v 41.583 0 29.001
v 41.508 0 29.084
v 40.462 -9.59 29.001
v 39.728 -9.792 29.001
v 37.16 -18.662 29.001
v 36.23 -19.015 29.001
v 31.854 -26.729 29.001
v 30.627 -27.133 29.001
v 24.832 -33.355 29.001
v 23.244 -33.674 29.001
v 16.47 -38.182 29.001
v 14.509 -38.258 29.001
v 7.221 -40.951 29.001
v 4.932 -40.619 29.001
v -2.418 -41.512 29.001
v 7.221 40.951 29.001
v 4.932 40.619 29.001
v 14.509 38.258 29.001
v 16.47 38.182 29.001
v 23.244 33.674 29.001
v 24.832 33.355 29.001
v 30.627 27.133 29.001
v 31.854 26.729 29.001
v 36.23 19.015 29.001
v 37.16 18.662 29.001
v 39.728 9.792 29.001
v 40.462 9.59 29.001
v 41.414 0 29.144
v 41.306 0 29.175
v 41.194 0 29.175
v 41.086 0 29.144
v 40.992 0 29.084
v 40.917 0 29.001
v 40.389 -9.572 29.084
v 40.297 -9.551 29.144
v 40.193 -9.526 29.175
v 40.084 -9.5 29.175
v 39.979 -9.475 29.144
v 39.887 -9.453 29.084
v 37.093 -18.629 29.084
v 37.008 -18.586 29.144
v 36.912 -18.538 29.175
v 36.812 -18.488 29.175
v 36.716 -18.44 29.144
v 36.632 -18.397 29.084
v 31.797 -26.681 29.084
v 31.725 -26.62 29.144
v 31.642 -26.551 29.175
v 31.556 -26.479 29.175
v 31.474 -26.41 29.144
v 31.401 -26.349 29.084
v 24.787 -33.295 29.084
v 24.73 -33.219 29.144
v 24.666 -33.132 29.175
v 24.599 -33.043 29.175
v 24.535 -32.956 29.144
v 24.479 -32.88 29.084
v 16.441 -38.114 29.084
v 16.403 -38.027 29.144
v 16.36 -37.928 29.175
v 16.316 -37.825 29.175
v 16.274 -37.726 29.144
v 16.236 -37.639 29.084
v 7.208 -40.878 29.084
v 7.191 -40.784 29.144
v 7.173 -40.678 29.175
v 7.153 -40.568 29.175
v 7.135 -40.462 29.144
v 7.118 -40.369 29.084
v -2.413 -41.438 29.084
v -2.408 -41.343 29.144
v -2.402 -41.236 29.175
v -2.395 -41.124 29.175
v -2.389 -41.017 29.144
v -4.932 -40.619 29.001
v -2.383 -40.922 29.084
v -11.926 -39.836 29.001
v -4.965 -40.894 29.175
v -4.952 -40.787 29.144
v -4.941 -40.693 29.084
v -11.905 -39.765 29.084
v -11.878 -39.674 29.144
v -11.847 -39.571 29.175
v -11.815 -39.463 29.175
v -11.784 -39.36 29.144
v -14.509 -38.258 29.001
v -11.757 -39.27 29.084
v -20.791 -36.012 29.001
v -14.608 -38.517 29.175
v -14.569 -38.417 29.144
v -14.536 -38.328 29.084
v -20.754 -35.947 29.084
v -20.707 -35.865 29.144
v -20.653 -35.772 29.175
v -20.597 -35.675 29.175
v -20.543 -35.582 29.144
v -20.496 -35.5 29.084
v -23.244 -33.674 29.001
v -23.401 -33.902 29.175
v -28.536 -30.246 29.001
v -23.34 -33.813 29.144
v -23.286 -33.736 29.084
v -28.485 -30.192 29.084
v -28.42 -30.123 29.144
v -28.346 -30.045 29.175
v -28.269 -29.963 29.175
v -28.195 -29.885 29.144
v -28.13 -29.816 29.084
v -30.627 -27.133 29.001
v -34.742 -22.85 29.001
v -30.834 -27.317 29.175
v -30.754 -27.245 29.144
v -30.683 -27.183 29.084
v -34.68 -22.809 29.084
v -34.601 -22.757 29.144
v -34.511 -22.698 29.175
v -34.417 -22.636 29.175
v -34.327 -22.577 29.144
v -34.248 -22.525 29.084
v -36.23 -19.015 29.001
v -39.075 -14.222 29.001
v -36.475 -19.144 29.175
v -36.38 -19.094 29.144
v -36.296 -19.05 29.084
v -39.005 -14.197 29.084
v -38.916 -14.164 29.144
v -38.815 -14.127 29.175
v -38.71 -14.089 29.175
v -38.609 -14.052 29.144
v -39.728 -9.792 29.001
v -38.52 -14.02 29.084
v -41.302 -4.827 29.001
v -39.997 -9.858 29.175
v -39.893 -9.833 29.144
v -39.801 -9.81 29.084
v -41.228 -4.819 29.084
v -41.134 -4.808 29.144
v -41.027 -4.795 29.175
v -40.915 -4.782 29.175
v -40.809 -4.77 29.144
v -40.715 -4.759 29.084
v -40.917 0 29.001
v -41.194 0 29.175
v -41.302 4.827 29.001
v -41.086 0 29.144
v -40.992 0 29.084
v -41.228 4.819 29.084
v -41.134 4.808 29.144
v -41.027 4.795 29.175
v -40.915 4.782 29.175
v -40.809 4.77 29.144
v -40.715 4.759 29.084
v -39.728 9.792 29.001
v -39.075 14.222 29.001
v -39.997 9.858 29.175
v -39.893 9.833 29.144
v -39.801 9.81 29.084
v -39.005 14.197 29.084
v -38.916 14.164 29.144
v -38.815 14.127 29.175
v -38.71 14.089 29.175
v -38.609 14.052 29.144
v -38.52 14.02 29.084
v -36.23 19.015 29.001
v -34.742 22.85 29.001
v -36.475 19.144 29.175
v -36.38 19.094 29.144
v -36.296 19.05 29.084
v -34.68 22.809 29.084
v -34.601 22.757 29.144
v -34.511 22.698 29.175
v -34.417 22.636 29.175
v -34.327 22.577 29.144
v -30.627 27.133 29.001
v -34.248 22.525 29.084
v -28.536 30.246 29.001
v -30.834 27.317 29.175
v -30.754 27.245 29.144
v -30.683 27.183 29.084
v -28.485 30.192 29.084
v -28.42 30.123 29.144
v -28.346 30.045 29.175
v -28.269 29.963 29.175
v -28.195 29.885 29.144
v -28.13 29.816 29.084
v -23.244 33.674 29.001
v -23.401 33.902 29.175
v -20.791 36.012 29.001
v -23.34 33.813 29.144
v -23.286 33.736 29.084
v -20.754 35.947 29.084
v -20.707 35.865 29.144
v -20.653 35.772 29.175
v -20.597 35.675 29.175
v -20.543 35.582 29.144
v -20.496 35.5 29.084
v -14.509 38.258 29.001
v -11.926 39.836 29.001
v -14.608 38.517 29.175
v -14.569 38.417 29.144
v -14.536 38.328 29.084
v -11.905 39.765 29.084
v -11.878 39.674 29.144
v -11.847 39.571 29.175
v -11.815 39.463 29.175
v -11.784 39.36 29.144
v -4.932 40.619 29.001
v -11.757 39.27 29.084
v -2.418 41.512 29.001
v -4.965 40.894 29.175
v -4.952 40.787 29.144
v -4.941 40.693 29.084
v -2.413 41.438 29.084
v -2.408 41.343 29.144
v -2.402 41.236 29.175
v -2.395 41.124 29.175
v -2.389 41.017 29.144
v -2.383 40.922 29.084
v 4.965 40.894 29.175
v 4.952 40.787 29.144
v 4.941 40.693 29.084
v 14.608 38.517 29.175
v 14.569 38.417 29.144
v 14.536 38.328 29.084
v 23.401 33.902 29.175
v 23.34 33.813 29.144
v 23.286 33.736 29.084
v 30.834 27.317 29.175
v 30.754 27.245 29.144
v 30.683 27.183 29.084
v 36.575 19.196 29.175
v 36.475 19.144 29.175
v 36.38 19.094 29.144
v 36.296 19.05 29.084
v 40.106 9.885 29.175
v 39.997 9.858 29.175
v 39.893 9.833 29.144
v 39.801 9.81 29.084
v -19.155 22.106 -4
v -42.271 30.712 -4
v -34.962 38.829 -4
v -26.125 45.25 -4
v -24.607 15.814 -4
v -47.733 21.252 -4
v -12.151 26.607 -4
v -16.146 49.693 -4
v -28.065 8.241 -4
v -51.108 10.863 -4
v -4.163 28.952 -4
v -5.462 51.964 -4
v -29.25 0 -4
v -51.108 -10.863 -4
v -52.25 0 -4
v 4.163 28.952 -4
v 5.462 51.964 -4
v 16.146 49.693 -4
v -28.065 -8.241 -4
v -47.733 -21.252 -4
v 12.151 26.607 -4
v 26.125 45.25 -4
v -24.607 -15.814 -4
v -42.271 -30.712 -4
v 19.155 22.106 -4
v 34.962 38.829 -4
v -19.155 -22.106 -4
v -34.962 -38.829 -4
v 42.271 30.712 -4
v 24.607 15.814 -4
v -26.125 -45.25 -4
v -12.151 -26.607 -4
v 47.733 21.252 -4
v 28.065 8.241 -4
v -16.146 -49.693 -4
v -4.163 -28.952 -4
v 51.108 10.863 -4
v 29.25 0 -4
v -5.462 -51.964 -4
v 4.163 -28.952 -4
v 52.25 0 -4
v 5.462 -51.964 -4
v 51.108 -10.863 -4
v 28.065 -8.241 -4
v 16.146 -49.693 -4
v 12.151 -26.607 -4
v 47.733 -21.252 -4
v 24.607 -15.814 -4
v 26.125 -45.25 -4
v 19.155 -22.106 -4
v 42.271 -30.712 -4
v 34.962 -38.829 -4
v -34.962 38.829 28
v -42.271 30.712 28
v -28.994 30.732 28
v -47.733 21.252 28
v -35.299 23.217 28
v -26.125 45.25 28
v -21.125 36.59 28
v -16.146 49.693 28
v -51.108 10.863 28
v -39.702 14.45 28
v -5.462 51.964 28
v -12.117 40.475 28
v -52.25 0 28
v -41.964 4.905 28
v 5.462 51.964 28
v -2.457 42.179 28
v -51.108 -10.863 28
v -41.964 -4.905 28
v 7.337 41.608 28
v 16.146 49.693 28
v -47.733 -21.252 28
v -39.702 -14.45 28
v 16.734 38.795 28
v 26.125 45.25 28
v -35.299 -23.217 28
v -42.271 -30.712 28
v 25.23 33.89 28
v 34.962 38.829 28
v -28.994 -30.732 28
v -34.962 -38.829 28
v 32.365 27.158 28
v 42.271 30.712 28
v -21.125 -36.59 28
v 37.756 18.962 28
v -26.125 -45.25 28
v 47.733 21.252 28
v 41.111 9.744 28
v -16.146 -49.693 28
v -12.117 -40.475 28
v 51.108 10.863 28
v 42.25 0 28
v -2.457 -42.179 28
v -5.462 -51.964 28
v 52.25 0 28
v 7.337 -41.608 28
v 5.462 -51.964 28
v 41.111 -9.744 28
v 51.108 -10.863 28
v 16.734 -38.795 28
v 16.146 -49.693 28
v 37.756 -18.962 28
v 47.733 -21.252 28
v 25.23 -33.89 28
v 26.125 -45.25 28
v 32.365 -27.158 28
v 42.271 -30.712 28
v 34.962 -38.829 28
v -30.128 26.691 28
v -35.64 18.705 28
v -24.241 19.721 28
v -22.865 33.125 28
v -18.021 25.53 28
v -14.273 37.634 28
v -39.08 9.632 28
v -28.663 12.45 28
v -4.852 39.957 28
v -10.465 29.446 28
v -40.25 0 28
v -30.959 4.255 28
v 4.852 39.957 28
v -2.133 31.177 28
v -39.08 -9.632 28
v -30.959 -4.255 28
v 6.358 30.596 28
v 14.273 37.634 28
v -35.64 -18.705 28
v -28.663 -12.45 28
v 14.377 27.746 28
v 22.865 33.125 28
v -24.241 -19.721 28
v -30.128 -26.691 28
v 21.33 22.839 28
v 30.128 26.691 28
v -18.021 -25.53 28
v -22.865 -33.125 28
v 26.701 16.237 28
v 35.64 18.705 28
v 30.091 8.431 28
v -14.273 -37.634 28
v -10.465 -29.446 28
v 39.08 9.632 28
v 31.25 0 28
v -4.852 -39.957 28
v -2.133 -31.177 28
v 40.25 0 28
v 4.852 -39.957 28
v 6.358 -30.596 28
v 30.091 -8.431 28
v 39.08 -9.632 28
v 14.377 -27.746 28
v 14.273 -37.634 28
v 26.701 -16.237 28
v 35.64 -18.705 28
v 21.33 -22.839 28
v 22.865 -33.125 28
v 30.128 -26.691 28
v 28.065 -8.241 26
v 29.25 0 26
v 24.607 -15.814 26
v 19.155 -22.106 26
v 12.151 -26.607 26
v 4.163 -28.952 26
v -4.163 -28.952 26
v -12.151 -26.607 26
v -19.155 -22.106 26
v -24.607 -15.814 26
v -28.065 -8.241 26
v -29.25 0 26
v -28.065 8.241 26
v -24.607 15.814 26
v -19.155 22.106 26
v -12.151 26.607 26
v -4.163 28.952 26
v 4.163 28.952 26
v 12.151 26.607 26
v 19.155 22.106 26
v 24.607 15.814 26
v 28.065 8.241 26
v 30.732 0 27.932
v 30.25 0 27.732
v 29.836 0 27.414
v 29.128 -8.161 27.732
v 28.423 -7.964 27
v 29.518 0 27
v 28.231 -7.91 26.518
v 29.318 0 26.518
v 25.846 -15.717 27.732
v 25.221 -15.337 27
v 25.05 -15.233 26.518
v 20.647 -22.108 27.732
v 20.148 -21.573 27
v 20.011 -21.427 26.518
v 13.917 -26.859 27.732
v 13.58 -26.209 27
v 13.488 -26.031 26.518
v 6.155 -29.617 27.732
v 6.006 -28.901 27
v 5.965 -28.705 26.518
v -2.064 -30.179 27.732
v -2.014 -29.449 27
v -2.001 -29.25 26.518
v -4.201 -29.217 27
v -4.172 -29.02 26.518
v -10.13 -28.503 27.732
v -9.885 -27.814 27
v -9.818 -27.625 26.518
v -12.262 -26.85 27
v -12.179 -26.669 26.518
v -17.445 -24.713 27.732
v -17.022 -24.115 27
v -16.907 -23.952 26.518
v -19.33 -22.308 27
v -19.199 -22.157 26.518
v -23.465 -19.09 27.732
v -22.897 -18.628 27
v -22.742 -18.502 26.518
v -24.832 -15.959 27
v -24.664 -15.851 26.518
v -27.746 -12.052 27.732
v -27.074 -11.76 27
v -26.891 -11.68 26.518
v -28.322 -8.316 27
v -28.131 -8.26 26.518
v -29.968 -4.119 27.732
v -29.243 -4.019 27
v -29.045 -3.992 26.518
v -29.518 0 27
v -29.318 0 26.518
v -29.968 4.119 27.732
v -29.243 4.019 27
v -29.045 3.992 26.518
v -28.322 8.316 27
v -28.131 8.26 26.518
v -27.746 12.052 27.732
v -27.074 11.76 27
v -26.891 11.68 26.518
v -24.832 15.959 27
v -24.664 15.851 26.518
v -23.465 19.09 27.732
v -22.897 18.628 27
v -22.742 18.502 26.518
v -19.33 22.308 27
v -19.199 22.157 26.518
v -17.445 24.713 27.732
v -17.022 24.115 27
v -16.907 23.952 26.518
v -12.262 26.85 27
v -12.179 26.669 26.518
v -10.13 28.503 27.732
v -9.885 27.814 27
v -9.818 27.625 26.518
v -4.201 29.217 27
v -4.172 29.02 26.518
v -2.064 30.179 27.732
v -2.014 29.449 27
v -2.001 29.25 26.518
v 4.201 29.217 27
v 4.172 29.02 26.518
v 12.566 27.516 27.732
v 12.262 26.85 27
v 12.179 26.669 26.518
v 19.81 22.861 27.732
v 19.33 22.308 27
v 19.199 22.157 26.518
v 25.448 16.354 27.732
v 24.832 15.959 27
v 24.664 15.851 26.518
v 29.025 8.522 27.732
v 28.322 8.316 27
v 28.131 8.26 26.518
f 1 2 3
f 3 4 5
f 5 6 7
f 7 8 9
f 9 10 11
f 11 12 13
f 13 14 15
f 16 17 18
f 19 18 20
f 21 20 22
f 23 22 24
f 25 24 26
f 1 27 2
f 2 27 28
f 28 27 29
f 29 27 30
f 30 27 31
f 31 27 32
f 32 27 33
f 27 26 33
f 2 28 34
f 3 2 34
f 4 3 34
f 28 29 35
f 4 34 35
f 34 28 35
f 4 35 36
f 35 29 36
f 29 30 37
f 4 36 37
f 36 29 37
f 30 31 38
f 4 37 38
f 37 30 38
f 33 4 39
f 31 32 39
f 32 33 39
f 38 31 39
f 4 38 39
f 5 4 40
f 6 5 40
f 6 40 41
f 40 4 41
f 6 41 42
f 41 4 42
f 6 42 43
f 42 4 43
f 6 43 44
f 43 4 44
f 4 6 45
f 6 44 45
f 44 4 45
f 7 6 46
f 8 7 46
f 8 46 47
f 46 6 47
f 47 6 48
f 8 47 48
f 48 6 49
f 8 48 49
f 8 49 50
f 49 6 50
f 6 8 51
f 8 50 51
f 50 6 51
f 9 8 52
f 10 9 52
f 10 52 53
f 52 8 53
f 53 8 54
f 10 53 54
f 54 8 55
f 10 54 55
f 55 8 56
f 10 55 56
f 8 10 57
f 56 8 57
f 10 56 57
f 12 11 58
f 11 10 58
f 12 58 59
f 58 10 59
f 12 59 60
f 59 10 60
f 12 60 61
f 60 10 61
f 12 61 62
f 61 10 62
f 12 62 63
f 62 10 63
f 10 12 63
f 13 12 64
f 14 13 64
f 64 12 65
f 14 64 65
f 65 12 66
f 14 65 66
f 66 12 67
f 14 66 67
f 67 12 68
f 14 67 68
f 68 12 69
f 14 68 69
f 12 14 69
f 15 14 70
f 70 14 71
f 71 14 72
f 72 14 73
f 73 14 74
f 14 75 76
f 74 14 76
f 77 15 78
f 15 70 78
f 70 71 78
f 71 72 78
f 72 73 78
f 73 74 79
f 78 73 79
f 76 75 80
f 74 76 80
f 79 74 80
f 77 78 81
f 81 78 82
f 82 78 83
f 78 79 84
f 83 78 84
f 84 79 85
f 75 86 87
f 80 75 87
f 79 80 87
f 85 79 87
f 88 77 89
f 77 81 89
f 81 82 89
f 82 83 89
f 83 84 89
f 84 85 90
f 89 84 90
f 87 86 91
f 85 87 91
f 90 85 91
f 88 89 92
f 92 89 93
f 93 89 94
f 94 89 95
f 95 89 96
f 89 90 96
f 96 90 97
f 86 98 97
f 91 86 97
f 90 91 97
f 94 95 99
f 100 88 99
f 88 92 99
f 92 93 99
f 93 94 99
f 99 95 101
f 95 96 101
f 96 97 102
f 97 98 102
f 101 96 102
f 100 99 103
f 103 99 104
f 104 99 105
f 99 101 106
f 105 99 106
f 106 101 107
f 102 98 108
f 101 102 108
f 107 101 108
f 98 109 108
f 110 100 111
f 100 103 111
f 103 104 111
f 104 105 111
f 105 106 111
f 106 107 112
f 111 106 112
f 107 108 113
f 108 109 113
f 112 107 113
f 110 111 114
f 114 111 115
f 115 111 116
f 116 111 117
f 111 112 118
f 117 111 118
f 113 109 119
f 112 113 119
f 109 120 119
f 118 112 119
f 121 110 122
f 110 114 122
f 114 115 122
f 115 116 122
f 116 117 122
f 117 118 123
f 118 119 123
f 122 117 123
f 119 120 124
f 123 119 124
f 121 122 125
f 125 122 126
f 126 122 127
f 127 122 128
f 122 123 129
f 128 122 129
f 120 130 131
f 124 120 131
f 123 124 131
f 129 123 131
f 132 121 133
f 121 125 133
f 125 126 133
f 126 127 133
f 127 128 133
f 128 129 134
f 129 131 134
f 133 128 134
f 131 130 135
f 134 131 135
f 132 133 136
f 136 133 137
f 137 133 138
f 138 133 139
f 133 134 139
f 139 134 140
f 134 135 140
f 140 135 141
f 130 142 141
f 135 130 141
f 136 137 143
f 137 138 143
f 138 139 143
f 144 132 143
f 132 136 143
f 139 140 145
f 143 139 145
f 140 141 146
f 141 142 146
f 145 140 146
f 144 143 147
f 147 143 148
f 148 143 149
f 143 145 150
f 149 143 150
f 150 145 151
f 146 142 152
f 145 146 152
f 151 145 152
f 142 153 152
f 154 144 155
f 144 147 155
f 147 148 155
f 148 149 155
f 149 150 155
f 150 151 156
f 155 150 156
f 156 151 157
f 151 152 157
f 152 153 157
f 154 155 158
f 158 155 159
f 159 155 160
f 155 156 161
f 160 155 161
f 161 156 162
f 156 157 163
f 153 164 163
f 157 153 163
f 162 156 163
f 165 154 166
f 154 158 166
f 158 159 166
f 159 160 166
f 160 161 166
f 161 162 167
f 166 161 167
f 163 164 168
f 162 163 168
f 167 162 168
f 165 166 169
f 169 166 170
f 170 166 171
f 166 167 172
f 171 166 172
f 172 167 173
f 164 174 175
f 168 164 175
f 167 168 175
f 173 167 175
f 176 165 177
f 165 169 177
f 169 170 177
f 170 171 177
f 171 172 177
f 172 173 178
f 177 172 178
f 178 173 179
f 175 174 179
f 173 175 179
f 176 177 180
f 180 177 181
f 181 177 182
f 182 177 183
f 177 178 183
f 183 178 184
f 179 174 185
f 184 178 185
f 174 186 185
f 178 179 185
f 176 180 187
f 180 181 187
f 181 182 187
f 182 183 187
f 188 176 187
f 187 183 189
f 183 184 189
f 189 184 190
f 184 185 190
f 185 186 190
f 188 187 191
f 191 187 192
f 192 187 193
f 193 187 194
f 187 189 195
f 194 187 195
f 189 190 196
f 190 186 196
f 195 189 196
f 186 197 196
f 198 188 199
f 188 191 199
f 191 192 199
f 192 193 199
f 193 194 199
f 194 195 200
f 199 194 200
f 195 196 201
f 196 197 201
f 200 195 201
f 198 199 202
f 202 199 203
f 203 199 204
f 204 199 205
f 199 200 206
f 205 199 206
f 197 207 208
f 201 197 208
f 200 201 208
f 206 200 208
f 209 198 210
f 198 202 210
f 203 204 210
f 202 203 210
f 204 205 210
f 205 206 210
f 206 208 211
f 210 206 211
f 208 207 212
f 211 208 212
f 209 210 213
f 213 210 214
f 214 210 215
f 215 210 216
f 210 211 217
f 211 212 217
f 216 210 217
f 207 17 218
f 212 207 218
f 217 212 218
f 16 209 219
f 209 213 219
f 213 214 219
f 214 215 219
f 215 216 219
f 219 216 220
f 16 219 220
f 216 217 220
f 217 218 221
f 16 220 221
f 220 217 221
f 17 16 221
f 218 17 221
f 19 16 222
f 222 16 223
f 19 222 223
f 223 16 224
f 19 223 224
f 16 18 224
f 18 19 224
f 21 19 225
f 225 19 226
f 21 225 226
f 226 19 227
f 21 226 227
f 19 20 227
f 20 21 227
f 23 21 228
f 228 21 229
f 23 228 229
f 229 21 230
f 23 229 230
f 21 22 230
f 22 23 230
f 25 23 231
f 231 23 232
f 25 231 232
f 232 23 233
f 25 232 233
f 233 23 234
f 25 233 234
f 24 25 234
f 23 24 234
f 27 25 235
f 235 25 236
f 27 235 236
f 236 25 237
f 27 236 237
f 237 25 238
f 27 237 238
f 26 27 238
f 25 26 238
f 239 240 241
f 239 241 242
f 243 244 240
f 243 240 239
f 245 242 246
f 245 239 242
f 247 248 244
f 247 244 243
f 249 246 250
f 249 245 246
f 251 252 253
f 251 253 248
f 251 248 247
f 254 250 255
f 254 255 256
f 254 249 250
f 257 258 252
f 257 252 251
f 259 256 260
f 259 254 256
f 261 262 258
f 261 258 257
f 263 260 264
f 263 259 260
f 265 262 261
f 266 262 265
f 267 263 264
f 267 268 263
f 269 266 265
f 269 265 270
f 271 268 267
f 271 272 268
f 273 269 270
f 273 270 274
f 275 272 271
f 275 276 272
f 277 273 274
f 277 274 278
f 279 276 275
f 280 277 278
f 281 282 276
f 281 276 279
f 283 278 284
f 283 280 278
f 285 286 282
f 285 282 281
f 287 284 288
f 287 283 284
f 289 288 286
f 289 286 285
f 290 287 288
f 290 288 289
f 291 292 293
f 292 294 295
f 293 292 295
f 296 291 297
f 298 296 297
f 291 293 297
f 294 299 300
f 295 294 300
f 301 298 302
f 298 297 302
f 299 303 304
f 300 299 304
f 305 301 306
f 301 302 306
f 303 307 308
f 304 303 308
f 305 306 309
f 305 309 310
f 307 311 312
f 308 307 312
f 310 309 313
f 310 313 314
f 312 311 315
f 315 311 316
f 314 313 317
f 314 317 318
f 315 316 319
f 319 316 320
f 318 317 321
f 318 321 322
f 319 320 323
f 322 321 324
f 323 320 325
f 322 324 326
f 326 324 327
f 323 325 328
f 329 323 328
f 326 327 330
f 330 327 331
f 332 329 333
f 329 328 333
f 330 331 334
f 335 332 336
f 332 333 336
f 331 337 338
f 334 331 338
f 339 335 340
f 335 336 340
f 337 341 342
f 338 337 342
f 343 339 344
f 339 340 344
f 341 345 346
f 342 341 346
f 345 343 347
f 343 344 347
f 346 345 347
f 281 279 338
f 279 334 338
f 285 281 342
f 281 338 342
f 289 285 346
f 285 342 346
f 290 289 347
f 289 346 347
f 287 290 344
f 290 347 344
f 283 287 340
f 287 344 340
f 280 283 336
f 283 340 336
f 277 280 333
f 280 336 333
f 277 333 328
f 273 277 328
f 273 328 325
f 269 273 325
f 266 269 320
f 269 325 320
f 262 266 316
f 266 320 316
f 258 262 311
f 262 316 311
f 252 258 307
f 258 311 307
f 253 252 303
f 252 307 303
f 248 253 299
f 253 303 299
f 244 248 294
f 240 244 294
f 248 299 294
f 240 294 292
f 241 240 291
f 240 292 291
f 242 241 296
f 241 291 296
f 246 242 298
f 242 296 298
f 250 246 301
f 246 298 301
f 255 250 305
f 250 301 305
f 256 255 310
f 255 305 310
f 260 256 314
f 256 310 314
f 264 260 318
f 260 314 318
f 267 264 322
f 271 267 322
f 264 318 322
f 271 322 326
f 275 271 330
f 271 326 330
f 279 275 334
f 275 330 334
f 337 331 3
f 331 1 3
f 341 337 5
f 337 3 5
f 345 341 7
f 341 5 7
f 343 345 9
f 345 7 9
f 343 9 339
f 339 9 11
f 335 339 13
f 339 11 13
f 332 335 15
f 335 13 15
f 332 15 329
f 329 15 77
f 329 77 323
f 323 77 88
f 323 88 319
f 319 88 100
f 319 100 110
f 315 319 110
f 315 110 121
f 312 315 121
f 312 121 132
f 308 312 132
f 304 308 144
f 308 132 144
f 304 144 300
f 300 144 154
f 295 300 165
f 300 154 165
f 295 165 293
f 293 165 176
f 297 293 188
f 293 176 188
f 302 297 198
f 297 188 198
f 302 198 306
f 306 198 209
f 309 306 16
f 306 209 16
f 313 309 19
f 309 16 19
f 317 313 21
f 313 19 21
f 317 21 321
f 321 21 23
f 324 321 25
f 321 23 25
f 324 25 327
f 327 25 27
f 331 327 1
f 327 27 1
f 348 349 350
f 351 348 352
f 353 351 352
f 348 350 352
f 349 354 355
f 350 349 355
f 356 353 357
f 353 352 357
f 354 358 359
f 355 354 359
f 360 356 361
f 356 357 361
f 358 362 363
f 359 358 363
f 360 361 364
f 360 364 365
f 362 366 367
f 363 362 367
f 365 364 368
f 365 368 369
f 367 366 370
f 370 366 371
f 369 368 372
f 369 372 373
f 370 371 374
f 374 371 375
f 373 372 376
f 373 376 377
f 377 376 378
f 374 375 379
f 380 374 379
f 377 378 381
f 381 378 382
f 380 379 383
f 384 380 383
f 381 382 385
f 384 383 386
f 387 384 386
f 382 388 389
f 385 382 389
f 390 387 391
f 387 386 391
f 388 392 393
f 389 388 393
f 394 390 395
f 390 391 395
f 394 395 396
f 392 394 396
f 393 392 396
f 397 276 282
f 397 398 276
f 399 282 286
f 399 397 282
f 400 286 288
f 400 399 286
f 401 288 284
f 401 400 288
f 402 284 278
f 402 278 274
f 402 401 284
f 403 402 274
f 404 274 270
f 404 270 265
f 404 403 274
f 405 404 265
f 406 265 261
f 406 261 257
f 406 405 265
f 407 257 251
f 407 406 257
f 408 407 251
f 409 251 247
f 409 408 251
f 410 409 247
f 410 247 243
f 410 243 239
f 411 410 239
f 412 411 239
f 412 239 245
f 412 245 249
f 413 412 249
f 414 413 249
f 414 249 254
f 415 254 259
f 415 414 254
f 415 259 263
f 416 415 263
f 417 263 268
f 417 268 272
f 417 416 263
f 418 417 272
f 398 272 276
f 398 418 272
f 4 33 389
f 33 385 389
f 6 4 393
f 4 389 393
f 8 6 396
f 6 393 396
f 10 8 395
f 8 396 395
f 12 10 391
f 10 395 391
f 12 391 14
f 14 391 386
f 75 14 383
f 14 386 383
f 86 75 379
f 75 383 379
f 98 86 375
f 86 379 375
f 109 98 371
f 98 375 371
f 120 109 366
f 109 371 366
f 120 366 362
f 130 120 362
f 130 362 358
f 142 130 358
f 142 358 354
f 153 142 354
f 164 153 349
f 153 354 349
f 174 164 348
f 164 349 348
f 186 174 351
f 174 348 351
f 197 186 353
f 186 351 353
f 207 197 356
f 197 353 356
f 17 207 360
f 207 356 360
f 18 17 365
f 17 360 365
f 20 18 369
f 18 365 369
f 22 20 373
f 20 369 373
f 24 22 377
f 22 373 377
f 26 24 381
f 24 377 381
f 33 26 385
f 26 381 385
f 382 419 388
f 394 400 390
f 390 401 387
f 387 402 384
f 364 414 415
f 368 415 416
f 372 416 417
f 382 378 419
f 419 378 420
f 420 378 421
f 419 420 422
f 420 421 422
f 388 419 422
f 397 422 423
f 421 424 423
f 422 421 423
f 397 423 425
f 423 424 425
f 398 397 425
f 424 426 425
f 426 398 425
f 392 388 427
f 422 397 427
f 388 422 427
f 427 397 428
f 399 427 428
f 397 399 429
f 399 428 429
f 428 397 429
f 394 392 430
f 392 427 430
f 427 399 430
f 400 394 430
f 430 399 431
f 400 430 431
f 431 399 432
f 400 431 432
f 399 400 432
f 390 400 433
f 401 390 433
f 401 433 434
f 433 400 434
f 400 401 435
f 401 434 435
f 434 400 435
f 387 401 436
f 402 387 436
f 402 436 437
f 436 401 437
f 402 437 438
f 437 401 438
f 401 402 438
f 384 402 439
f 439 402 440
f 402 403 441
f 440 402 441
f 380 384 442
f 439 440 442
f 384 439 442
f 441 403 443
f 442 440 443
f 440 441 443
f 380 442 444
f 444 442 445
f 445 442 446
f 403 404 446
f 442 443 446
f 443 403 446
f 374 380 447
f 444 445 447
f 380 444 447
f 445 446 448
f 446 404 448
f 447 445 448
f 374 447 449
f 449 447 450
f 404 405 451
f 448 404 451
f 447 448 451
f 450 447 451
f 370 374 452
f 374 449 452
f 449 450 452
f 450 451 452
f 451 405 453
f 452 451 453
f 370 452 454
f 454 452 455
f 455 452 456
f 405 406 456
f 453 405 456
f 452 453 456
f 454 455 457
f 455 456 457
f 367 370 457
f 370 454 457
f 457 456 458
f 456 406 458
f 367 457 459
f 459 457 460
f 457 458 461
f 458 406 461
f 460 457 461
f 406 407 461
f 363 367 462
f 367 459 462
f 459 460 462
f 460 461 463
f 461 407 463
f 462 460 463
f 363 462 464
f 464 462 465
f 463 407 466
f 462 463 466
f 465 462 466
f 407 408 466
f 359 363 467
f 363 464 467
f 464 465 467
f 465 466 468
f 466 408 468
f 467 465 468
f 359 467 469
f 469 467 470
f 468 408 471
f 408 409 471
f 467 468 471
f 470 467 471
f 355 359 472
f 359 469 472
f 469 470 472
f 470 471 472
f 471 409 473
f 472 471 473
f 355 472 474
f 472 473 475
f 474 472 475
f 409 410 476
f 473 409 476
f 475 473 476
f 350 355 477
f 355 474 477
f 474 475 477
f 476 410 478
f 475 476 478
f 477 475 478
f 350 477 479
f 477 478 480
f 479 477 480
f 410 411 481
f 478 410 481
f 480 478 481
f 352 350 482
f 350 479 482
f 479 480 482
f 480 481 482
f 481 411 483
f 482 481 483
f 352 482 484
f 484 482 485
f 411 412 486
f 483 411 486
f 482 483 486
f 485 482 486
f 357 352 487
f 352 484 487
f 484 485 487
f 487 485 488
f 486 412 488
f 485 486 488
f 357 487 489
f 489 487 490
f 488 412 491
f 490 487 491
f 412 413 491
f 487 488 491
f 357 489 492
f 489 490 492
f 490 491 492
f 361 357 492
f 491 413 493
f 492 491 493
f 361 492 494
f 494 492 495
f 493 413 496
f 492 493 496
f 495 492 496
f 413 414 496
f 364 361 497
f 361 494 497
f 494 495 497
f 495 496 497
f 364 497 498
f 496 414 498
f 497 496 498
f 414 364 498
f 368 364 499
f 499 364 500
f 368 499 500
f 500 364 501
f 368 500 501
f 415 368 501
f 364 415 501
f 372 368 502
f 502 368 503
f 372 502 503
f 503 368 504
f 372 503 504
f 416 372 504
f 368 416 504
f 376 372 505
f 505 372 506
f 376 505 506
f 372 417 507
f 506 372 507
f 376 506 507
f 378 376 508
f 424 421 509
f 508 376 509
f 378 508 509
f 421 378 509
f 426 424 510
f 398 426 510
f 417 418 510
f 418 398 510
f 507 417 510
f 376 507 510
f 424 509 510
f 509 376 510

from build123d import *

# Parameters (mm, degrees)
F2_R     = 52.25
F2_R_2   = 29.25
F3_DEPTH = 4


with BuildPart() as f1:
    # F0 (on Front) → F1 (revolve)
    with BuildSketch(Plane.XZ):
        with BuildLine():
            Line((40.25, 28), (31.25, 28))
            ThreePointArc((31.25, 28), (29.835786, 27.414214), (29.25, 26))
            Line((29.25, 26), (29.25, 0))
            Line((29.25, 0), (52.25, 0))
            Line((52.25, 0), (52.25, 28))
            Line((52.25, 28), (44.25, 28))
            Line((44.25, 28), (42.25, 28))
            Line((42.25, 28), (41.58282, 29.00077))
            ThreePointArc((41.58282, 29.00077), (41.25, 29.17889), (40.91718, 29.00077))
            Line((40.91718, 29.00077), (40.25, 28))
        make_face()
    revolve(axis=Axis((0, 0, 14), (0, 0, -1)))

    # F2 (on face) → F3 (join)
    with BuildSketch(Plane(origin=(0, 0, 0), x_dir=(1, 0, 0), z_dir=(0, 0, -1))):
        Circle(F2_R)
        Circle(F2_R_2, mode=Mode.SUBTRACT)
    extrude(amount=F3_DEPTH)


solid = f1.part
